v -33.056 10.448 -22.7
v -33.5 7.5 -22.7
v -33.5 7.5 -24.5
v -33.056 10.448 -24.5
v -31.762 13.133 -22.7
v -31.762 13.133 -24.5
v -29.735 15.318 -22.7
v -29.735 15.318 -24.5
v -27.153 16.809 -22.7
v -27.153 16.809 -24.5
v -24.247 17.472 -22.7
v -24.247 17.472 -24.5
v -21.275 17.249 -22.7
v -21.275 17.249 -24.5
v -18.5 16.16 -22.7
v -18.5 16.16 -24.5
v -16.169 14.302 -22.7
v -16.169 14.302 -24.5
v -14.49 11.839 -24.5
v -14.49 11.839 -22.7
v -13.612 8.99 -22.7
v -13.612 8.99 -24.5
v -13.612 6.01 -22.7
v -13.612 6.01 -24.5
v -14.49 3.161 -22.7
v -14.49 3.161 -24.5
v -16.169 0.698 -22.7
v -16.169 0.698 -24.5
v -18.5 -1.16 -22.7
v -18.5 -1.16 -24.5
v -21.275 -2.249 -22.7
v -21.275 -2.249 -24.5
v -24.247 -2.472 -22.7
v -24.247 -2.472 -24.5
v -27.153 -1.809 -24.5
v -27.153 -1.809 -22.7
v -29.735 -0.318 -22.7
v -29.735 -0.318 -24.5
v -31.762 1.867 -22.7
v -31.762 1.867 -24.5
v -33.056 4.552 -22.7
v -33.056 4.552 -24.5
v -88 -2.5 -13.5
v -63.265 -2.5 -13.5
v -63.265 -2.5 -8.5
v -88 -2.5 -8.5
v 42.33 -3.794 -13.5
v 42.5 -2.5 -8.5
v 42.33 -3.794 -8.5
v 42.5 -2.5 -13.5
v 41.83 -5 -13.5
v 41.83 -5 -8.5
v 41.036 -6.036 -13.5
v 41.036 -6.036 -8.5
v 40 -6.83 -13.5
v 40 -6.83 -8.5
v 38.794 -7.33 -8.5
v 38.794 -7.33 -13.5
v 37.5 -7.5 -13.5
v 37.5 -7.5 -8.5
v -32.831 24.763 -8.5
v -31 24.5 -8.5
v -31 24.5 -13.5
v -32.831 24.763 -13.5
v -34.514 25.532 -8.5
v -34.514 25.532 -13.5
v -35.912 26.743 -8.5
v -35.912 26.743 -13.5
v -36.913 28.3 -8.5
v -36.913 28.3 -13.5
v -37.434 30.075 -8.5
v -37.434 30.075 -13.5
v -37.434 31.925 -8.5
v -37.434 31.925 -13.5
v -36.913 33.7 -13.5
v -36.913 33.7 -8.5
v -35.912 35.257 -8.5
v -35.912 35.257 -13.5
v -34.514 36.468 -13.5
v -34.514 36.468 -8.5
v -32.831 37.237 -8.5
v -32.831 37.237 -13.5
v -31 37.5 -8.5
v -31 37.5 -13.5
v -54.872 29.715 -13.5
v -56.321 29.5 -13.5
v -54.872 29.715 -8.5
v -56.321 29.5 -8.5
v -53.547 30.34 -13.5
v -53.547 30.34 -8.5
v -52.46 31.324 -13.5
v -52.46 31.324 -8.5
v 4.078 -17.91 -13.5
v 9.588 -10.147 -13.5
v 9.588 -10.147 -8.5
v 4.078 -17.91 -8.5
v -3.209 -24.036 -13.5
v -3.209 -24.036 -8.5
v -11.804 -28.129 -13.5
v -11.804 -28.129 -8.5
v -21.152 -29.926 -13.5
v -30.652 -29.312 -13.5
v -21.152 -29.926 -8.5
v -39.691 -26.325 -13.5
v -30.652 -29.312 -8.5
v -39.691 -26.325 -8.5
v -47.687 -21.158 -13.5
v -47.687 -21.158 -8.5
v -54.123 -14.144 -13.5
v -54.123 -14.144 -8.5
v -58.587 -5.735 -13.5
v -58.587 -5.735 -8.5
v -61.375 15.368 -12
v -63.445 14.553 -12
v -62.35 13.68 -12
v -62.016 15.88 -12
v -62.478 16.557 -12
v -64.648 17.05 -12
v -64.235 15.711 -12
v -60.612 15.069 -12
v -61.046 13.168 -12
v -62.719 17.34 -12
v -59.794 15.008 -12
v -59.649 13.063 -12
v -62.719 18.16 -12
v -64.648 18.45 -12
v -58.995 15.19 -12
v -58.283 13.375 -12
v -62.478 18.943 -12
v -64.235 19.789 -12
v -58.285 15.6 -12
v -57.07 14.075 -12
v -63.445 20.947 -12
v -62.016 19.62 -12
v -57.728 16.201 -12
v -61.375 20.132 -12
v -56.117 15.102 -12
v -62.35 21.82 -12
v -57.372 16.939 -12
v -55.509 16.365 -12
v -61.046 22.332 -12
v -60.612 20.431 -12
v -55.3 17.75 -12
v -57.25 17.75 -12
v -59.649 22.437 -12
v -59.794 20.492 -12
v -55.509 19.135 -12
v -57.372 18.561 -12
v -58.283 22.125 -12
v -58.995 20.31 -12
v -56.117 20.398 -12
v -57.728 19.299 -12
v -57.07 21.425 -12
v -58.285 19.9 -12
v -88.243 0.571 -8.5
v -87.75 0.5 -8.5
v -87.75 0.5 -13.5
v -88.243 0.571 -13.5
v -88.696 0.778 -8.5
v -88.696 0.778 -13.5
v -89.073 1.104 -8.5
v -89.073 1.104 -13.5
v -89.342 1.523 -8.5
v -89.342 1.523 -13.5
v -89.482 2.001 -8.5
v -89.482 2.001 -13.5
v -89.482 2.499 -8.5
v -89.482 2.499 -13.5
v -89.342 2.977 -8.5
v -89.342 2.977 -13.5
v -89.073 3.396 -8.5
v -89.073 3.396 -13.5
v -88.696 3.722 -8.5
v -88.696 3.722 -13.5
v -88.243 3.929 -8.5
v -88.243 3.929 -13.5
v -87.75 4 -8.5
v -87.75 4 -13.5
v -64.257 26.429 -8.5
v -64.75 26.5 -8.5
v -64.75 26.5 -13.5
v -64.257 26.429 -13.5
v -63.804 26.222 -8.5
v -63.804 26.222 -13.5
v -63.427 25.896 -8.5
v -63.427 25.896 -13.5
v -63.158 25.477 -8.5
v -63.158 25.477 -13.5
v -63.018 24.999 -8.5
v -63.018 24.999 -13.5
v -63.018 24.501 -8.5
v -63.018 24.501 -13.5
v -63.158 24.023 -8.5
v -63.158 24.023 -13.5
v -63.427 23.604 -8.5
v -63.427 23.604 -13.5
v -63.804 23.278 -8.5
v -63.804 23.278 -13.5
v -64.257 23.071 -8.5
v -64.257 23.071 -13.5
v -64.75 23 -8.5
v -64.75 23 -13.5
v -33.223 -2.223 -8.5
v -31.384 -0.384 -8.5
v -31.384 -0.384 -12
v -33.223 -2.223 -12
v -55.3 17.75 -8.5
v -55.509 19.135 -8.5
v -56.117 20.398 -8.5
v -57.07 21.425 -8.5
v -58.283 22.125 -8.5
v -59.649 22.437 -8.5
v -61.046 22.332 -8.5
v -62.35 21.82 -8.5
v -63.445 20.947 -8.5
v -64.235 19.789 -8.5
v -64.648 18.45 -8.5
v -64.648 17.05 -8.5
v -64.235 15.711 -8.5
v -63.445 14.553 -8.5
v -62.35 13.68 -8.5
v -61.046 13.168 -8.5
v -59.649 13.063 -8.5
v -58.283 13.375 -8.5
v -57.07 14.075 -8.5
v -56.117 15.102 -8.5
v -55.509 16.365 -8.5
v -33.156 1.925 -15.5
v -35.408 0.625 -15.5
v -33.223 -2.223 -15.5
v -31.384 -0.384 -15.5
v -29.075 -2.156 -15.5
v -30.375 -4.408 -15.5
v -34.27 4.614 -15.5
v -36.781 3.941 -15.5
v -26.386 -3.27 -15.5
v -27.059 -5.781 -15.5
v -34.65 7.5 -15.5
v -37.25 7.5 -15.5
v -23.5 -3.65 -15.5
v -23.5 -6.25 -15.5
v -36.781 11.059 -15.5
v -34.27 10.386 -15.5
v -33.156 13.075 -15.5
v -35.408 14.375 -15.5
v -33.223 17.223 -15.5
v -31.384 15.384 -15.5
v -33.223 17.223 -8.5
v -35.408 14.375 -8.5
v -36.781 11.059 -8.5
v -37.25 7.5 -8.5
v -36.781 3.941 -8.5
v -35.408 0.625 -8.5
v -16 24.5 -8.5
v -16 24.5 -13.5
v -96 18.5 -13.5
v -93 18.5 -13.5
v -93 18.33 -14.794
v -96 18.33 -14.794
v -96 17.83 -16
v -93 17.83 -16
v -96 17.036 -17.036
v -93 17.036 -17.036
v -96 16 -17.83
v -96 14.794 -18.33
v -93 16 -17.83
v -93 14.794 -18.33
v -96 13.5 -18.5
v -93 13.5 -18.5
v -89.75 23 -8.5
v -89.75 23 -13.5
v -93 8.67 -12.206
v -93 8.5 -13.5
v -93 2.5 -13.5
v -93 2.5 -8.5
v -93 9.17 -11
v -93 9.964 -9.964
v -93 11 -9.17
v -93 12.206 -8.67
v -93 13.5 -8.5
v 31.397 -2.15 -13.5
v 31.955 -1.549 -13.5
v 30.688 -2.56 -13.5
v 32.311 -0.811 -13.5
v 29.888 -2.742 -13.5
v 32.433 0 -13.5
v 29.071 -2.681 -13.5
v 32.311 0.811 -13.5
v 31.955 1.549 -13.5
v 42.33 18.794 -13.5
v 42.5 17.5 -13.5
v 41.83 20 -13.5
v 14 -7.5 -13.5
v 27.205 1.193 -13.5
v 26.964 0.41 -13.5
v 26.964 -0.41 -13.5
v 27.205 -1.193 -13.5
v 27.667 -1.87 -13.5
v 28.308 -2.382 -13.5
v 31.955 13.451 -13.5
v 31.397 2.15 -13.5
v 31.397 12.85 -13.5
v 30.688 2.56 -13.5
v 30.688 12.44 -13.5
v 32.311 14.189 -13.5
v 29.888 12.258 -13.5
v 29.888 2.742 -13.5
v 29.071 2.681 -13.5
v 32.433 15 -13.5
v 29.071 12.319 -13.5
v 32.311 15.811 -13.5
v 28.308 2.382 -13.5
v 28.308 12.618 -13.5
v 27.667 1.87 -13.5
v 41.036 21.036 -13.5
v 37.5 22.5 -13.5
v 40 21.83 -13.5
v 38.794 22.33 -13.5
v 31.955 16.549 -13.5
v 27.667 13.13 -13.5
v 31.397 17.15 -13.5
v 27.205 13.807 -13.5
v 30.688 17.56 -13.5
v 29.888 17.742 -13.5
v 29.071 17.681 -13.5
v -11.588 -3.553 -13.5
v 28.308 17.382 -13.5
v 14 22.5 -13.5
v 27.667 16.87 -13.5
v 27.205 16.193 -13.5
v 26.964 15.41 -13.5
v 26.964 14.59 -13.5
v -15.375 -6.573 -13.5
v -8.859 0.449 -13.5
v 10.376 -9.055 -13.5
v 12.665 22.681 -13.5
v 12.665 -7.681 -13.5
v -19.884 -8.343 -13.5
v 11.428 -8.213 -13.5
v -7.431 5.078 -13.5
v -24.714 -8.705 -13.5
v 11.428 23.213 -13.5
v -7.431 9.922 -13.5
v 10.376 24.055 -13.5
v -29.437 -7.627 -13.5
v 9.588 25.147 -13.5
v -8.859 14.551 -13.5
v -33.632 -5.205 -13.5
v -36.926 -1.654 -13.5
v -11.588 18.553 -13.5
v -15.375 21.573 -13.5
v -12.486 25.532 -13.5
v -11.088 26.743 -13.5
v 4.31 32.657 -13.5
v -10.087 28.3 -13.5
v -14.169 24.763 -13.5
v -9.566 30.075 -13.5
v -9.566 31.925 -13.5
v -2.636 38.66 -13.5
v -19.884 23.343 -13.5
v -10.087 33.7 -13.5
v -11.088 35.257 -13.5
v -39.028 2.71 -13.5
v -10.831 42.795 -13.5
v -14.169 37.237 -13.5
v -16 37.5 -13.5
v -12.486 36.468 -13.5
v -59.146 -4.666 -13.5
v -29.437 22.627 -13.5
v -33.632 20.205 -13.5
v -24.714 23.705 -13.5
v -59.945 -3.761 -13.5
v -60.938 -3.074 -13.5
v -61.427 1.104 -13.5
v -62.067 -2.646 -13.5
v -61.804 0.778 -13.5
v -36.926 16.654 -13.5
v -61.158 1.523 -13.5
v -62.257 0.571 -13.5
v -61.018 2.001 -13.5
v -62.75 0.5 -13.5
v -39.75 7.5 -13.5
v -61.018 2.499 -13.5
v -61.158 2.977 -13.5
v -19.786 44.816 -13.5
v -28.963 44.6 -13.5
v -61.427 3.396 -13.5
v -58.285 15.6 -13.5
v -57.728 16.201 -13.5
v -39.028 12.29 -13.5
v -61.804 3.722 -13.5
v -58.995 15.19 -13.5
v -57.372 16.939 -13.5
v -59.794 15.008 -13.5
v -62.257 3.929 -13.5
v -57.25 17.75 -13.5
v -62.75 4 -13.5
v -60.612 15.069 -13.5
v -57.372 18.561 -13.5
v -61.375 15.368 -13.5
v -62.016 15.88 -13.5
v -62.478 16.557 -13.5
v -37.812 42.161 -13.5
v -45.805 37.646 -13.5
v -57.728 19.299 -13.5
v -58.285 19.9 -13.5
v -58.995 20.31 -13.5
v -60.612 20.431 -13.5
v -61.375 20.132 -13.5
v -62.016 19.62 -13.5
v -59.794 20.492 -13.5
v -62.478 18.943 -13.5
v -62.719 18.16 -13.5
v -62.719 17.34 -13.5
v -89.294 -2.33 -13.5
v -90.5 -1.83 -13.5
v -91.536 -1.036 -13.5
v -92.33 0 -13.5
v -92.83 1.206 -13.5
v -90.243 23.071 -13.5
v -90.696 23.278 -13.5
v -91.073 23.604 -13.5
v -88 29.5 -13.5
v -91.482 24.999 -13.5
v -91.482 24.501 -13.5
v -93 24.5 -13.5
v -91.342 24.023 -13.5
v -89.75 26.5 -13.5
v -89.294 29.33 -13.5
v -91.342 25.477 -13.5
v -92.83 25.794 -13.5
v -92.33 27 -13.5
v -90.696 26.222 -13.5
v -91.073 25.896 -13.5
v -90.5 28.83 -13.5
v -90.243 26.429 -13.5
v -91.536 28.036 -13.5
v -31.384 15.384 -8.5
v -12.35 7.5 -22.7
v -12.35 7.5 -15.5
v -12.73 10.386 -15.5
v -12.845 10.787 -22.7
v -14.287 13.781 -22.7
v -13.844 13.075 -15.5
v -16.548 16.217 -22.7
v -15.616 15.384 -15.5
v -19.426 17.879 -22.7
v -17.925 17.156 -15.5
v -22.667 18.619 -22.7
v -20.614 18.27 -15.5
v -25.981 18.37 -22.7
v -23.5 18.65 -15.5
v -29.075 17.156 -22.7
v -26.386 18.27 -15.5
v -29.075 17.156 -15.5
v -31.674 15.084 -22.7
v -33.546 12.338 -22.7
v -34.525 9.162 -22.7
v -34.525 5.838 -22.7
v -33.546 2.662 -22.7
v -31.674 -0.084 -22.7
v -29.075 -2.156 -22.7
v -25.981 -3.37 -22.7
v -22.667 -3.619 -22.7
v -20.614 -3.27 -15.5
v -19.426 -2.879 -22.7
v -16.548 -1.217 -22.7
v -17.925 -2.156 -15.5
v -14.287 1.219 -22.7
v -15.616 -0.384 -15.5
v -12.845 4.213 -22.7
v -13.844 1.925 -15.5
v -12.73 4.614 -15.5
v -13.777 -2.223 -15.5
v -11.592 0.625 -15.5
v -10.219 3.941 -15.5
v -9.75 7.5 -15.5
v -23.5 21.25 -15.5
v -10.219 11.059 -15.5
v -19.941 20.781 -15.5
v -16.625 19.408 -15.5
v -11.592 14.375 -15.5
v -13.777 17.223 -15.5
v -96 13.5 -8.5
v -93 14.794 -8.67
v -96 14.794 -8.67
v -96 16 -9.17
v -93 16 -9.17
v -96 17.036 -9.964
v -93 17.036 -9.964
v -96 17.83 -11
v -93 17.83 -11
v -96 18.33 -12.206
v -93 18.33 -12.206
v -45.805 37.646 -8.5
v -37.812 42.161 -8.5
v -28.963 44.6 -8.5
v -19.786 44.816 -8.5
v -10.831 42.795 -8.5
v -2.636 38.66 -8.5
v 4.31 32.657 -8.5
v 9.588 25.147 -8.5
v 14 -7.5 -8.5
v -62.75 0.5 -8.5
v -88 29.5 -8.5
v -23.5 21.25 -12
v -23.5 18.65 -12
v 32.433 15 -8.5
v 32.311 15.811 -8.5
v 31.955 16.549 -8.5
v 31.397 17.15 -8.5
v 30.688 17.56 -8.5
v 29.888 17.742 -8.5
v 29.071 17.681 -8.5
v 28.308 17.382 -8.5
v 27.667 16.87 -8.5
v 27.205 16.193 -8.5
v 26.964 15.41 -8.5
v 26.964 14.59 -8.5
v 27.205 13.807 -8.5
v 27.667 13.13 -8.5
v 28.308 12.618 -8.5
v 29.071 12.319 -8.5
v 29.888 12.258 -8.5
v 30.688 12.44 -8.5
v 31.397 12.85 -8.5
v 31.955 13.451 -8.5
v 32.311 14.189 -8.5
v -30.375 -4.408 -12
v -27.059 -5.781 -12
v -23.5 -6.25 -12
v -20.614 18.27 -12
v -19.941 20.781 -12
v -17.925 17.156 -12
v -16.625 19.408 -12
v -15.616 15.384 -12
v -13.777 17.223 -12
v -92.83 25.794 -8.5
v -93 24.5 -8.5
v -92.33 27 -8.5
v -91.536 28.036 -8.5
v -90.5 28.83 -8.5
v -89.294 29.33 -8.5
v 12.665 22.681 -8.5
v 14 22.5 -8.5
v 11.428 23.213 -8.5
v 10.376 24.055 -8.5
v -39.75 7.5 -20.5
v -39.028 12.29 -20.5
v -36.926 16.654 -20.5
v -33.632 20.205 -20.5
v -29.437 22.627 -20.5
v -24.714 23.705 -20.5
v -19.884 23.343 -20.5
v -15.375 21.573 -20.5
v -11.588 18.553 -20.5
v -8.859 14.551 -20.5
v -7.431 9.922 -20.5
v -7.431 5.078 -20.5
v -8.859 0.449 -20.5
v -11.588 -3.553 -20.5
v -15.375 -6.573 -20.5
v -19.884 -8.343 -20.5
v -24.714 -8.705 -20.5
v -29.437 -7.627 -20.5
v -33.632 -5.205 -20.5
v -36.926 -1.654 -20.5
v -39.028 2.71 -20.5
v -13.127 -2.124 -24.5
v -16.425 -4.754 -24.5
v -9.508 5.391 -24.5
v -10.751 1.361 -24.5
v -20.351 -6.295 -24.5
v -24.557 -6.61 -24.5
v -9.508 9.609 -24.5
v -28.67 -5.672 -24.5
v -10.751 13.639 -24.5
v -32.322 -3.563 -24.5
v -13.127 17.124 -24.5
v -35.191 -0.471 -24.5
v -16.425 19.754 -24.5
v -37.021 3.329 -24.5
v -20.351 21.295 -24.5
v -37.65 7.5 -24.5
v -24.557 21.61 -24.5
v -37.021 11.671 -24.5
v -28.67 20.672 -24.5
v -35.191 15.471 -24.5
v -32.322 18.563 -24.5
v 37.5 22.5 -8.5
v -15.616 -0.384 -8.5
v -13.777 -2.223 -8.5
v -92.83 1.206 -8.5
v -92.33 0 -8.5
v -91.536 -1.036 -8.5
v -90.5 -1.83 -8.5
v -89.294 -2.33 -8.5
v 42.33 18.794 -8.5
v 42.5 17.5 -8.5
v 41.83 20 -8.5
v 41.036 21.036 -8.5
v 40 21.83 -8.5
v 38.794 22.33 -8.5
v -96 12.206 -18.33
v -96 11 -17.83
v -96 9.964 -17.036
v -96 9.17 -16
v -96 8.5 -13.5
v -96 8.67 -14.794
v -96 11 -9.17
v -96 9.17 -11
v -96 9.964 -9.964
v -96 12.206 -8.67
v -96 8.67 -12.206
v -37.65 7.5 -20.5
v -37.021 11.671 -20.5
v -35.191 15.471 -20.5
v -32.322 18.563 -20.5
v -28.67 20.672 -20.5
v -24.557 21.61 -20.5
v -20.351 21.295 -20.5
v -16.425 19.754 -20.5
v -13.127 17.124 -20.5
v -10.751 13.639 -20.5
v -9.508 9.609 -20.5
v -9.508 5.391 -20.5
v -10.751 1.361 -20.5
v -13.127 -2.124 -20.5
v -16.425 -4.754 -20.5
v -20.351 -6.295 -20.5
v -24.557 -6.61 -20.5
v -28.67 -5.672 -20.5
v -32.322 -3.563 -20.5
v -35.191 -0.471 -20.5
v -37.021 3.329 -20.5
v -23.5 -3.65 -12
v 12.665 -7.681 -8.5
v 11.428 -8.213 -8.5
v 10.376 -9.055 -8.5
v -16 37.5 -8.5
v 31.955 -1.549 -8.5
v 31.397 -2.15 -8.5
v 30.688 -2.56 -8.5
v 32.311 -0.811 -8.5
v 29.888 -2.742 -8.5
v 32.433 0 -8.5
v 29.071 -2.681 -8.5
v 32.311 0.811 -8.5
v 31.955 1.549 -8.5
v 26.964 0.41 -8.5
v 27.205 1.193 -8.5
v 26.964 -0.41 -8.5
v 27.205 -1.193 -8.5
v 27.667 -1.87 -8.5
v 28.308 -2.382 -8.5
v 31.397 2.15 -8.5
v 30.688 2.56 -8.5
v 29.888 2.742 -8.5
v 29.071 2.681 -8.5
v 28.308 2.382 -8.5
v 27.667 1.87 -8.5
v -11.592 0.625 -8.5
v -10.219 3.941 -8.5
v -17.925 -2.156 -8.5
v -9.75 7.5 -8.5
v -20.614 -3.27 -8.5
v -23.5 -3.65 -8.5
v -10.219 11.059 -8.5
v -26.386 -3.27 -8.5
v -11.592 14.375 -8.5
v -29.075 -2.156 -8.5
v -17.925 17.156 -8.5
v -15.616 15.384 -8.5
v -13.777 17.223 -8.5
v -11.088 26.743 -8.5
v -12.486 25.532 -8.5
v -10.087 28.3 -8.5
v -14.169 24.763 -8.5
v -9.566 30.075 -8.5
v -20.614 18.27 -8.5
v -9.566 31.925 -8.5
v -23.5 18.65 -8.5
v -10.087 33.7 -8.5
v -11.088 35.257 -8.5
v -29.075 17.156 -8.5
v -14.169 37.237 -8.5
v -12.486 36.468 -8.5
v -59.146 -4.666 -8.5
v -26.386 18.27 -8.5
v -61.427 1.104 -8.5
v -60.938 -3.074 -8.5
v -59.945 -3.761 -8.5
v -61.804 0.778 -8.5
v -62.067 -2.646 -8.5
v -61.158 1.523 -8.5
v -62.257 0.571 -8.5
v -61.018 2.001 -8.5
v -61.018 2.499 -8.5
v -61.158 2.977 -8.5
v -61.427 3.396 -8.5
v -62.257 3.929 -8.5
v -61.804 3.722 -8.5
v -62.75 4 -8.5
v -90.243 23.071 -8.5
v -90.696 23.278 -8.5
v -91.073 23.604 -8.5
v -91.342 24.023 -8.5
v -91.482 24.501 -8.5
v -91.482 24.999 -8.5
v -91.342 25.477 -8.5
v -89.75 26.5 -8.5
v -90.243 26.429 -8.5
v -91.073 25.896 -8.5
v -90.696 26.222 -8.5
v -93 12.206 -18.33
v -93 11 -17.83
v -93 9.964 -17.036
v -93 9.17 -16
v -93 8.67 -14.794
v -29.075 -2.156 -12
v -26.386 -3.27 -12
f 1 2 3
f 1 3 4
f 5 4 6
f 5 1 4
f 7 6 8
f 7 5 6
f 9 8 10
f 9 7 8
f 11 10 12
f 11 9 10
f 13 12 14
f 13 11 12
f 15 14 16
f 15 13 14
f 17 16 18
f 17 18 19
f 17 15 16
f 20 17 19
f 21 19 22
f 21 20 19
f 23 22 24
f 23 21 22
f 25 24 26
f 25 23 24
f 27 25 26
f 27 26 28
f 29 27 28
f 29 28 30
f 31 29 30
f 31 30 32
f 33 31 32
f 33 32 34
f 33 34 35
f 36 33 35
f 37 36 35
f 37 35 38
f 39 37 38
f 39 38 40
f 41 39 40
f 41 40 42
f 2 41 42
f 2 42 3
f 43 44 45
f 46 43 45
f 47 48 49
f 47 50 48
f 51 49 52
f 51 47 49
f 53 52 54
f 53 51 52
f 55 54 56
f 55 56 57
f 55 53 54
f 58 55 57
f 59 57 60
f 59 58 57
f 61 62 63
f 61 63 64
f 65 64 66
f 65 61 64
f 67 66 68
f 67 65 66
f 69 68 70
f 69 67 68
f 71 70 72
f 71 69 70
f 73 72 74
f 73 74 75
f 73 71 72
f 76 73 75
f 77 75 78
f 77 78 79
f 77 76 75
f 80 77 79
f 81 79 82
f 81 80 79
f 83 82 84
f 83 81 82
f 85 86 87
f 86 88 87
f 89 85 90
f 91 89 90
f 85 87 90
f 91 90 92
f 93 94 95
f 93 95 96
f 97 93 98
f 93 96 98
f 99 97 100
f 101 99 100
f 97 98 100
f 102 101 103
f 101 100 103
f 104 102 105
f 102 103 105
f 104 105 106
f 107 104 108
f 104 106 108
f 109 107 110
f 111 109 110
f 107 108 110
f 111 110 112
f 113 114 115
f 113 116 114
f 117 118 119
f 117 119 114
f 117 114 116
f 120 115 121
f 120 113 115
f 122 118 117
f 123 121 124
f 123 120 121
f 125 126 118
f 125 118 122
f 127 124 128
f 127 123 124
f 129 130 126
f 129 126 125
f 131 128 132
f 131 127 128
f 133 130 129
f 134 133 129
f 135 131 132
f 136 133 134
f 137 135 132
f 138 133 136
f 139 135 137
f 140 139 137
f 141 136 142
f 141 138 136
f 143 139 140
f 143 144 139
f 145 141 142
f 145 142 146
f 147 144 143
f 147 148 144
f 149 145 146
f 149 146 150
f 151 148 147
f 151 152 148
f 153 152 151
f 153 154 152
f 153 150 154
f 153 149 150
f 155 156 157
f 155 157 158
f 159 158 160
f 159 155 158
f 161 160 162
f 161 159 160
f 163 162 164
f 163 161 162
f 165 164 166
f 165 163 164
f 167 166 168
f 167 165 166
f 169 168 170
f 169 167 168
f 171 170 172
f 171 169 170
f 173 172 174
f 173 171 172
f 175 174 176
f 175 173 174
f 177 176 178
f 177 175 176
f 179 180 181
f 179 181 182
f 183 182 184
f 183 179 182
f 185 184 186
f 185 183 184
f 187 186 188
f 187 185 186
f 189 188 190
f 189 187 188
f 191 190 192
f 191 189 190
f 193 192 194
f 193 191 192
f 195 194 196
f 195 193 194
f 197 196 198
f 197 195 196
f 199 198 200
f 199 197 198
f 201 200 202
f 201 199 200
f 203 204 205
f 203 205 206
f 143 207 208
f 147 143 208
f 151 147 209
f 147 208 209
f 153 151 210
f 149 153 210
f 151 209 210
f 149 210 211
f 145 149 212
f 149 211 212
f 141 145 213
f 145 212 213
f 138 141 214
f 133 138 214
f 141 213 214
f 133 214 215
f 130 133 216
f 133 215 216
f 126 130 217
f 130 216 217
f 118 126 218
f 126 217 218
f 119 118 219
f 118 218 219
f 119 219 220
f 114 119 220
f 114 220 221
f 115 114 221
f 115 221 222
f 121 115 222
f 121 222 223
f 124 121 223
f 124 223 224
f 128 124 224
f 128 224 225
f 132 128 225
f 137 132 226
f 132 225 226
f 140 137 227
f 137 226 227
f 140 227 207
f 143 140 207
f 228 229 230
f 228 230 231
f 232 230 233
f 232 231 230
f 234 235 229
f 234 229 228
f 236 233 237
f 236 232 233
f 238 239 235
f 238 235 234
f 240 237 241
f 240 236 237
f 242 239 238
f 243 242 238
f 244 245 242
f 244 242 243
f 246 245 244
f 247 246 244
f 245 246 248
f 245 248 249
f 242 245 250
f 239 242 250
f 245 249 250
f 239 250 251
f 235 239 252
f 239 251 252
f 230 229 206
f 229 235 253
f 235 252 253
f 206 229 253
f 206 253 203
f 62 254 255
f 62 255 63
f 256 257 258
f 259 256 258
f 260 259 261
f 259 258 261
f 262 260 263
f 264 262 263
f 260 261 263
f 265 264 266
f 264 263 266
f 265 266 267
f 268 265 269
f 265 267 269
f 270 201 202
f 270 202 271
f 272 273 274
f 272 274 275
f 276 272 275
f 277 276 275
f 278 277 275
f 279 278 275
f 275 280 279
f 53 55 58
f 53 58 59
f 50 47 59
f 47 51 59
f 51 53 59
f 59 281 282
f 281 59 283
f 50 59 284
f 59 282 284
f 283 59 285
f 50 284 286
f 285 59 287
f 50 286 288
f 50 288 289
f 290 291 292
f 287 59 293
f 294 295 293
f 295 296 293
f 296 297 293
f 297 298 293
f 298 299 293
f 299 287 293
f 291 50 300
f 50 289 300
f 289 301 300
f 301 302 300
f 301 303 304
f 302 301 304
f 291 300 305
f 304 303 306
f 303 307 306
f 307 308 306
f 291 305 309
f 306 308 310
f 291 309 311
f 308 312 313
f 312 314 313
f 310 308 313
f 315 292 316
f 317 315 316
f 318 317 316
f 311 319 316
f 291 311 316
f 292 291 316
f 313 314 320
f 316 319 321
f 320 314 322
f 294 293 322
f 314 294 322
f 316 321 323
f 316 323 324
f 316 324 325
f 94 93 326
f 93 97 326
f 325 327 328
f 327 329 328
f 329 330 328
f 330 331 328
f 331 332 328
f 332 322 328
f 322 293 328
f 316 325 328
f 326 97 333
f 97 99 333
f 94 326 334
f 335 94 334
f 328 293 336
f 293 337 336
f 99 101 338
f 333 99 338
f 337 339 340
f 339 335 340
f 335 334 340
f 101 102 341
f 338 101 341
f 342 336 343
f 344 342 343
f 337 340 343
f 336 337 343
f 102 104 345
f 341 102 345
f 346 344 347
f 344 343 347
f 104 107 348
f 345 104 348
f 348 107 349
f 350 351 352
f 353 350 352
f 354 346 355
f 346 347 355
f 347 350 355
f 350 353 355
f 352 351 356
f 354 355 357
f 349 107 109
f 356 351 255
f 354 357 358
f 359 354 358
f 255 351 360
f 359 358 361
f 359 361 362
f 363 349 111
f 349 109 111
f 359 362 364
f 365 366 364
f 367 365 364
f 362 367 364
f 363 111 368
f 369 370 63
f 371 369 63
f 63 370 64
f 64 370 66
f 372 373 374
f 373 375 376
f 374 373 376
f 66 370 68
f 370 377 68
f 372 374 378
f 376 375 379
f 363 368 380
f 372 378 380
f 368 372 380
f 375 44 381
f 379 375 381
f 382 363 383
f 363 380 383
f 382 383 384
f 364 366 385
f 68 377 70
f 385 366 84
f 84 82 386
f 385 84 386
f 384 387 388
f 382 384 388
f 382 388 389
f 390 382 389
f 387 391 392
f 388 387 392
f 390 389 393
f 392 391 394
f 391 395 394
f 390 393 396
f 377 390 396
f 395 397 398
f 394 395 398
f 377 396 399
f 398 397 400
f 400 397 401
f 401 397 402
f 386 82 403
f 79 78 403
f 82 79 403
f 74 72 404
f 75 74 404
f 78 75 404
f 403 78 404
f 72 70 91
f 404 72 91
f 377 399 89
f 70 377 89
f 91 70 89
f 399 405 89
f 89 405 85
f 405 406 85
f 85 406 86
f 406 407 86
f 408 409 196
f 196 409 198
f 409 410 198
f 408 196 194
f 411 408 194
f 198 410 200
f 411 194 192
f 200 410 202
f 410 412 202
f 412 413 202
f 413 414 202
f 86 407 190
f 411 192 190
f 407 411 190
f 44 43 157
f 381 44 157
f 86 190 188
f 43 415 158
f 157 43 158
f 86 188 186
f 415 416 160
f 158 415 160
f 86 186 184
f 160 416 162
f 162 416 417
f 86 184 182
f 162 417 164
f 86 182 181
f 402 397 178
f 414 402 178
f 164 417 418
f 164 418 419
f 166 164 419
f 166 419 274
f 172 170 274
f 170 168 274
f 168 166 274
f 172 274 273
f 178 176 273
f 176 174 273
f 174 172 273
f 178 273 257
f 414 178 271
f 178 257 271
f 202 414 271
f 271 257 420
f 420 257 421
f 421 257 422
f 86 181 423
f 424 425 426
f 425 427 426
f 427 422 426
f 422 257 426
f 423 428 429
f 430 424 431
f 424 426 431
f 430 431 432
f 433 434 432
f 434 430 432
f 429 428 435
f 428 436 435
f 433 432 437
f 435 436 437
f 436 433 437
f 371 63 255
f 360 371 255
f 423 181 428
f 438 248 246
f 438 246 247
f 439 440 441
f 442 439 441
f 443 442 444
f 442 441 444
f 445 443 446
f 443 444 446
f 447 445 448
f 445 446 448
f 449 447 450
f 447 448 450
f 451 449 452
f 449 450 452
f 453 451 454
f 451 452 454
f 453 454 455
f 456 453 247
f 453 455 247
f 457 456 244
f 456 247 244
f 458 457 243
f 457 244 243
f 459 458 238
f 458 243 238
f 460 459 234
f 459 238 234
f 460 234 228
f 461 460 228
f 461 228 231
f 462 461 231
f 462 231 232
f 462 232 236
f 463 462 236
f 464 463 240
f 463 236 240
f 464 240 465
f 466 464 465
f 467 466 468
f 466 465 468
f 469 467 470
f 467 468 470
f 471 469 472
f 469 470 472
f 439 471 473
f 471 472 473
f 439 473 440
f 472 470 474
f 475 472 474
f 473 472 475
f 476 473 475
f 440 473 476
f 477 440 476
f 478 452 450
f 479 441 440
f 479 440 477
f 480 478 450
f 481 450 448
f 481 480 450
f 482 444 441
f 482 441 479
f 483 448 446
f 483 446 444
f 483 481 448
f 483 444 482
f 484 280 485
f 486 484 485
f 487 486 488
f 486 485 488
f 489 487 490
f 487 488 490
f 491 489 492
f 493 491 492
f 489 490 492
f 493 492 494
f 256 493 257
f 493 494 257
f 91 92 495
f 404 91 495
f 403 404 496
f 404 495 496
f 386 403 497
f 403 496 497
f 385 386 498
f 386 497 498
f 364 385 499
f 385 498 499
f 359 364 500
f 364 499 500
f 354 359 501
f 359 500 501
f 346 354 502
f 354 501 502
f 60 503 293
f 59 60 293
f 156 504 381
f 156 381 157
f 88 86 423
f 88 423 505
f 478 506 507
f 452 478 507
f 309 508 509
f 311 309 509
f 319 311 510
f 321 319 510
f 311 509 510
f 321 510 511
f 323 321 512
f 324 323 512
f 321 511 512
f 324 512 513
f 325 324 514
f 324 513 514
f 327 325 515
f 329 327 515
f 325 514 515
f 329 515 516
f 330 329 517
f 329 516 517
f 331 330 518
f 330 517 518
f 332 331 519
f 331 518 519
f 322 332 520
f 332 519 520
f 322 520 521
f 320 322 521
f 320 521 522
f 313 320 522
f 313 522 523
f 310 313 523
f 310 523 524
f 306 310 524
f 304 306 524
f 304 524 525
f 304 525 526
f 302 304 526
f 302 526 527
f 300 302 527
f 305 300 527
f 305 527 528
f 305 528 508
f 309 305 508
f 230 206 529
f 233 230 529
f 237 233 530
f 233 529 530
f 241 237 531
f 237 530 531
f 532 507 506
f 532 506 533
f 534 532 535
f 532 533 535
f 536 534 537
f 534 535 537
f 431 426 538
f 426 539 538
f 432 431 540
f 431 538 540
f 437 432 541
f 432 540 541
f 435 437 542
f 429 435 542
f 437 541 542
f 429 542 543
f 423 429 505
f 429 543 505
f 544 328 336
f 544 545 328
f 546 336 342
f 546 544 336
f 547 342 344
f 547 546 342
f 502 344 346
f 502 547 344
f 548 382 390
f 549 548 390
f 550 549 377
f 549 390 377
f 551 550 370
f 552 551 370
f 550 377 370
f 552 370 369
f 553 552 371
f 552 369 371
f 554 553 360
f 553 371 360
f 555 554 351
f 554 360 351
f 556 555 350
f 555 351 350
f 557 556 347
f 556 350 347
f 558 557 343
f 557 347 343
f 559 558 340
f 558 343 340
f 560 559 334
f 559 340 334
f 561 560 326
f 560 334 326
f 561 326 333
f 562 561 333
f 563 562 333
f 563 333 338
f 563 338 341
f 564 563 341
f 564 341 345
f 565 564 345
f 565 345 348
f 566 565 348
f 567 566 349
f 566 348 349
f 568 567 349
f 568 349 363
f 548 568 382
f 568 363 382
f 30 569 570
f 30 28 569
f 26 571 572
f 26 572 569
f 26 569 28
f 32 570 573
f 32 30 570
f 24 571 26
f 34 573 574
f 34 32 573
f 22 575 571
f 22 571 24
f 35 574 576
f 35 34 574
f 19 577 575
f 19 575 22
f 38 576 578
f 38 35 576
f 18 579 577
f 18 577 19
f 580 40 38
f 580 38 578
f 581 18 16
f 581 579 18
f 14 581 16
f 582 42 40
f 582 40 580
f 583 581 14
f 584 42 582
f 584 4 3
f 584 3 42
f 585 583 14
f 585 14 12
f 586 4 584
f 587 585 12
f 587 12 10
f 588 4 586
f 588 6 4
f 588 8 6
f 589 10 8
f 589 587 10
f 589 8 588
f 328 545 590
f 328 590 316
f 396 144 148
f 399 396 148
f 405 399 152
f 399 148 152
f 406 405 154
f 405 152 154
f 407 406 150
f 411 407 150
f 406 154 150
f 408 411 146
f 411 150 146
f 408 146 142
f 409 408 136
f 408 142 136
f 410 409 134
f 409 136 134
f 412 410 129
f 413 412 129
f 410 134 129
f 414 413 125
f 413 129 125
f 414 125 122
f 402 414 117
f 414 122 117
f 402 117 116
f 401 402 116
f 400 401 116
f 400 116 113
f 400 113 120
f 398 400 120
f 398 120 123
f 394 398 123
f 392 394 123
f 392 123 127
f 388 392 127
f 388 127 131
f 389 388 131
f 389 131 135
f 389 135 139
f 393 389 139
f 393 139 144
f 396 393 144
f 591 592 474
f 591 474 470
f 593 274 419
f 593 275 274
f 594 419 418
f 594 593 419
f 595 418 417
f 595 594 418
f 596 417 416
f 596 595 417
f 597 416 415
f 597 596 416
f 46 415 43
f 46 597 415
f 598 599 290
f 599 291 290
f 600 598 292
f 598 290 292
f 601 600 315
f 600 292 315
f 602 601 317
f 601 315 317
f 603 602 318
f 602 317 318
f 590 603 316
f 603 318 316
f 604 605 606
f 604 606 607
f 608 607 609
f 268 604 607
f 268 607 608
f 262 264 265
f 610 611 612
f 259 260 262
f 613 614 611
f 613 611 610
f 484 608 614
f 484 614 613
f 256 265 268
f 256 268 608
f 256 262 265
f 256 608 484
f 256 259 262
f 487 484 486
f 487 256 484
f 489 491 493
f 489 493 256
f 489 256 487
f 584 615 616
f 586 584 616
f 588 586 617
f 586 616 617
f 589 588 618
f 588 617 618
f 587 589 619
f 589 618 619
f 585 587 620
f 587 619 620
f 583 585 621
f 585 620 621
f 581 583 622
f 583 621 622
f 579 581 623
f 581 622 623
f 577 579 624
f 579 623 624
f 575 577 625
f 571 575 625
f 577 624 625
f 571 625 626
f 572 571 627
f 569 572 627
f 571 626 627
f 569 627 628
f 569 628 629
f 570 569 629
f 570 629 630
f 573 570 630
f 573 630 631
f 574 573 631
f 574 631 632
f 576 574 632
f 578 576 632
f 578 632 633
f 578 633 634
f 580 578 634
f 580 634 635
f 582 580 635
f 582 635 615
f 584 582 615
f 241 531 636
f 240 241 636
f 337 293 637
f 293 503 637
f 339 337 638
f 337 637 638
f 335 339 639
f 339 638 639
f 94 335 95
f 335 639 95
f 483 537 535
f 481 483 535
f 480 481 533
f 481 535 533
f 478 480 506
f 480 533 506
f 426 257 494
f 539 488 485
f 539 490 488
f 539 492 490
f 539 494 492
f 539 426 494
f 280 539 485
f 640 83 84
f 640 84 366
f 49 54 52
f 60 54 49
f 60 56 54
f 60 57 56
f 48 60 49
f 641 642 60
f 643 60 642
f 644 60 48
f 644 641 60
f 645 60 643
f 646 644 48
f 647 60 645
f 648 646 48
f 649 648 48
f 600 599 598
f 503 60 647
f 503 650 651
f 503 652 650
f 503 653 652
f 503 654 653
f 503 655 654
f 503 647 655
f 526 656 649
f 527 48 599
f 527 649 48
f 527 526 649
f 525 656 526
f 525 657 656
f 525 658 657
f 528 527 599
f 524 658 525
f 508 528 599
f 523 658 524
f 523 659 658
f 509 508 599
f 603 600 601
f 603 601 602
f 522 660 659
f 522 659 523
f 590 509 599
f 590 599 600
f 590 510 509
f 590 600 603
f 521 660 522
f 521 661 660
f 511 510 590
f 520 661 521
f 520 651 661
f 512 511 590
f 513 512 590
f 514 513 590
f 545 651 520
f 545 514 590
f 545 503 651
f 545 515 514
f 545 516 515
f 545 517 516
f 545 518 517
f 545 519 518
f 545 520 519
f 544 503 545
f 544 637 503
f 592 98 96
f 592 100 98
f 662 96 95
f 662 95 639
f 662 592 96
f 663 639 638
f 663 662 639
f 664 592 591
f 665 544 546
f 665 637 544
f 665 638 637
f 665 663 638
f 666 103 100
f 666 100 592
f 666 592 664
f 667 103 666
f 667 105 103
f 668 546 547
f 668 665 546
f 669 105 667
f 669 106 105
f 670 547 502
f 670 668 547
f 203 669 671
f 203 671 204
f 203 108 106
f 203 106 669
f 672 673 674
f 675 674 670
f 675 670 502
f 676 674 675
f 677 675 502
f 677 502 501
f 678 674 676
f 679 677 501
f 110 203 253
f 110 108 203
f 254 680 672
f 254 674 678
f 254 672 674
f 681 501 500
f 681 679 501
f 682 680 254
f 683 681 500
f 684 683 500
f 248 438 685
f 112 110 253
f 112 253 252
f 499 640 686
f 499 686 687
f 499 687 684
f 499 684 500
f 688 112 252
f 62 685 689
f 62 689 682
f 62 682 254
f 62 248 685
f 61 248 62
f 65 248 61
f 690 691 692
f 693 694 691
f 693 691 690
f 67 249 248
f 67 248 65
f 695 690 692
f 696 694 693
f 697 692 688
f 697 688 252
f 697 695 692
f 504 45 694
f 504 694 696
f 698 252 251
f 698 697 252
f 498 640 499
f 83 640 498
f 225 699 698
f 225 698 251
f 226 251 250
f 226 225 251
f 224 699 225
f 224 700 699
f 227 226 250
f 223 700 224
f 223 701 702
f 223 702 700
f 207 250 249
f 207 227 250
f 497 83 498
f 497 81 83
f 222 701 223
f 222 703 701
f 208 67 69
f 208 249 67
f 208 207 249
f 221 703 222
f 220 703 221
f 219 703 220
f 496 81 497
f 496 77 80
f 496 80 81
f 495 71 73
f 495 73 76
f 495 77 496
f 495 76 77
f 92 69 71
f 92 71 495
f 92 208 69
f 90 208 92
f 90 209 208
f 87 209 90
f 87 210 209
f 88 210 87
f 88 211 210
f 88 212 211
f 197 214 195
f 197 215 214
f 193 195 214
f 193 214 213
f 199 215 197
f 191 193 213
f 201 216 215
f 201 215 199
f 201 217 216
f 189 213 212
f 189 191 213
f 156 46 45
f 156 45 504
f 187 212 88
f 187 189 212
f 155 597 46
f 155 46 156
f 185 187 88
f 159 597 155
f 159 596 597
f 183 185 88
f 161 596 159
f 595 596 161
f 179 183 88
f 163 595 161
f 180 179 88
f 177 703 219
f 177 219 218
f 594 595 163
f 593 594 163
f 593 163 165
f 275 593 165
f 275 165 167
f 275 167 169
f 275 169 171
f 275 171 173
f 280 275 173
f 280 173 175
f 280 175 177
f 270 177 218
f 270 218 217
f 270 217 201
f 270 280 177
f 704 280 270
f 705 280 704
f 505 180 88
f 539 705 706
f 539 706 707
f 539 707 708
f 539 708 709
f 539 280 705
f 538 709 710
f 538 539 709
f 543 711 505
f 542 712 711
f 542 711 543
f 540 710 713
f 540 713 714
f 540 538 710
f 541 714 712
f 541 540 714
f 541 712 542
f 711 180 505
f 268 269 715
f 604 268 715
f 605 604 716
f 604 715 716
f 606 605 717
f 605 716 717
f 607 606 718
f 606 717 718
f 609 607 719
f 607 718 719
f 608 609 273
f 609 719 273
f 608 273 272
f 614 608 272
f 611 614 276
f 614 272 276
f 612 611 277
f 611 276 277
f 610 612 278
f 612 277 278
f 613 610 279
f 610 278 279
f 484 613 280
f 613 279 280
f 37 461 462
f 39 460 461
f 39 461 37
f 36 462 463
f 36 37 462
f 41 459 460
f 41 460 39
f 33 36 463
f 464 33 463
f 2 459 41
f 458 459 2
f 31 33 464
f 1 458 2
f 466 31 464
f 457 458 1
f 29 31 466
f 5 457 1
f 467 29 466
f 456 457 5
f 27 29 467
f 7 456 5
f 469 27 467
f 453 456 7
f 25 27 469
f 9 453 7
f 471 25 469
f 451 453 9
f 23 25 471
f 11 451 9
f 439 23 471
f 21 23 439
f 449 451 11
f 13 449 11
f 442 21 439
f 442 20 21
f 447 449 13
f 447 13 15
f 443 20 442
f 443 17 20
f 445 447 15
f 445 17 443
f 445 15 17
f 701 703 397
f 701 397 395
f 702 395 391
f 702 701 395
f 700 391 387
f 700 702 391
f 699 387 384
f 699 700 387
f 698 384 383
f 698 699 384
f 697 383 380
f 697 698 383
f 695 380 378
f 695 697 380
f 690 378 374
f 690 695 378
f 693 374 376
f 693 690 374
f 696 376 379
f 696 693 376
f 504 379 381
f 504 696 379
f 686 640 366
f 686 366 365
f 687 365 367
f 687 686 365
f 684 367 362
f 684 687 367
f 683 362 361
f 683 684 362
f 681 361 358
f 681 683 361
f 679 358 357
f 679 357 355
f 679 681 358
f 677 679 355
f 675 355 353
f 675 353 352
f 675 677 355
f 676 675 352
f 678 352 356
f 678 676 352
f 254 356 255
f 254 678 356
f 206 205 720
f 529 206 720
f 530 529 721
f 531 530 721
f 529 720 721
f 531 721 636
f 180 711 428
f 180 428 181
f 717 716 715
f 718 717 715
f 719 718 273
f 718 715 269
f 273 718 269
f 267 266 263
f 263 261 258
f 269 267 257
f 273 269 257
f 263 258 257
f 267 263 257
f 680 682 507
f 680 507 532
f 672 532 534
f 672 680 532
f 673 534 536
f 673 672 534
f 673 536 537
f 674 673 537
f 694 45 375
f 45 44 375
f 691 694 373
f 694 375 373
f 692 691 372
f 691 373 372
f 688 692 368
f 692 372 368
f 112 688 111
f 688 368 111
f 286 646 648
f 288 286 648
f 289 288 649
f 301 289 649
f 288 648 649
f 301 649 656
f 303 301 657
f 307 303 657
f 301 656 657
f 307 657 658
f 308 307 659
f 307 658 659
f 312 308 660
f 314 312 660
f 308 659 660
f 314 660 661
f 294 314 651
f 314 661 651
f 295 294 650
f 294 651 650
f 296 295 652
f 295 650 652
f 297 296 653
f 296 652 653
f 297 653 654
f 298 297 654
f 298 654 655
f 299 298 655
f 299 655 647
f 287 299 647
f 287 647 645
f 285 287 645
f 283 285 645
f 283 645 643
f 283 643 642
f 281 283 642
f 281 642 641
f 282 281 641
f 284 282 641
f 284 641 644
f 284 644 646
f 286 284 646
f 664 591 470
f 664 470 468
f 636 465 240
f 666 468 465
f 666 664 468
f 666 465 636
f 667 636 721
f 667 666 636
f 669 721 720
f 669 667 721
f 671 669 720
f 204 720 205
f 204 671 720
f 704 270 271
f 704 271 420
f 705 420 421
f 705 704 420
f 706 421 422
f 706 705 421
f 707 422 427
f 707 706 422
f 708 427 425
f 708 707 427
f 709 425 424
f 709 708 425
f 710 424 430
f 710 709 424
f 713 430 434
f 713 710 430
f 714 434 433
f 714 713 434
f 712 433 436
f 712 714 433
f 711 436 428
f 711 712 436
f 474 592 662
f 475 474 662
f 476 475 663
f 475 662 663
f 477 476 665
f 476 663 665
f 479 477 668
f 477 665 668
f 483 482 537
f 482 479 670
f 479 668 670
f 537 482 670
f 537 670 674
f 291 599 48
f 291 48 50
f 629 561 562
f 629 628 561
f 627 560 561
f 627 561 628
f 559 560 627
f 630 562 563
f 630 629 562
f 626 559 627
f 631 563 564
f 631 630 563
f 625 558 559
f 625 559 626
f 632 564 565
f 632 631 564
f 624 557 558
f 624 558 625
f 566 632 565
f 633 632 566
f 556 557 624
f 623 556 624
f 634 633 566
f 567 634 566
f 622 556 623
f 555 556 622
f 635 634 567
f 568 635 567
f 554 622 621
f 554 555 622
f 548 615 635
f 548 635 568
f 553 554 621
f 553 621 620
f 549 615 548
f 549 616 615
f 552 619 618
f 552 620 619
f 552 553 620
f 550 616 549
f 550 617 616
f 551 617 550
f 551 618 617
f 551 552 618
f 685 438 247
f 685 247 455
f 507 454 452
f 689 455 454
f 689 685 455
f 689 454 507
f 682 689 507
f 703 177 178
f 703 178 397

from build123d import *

# Parameters (mm, degrees)
SKETCH2_R                = 37.5
SKETCH2_R_2              = 4.2
BOSS_EXTRUDE1_DEPTH      = 5
SKETCH3_R                = 11.15
CUT_EXTRUDE1_DEPTH       = 76.967098141
SKETCH5_R                = 14.15
SKETCH5_R_2              = 11.15
BOSS_EXTRUDE2_DEPTH      = 10
BOSS_EXTRUDE3_START      = -2
SKETCH6_R                = 14.15
SKETCH6_R_2              = 9
BOSS_EXTRUDE3_DEPTH      = 2
SKETCH7_R                = 11.15
CUT_EXTRUDE2_DEPTH       = 10
SKETCH8_R                = 14.15
SKETCH8_R_2              = 10
BOSS_EXTRUDE4_DEPTH      = 2
BOSS_EXTRUDE5_DEPTH      = 5
BOSS_EXTRUDE5_DEPTH_BACK = 5
SKETCH10_W               = 10
SKETCH10_H               = 30
BOSS_EXTRUDE6_DEPTH      = 10
CUT_EXTRUDE3_START       = -5
CUT_EXTRUDE3_DEPTH       = 5
SKETCH12_R               = 2.75
CUT_EXTRUDE4_DEPTH       = 78.472575793
BOSS_EXTRUDE7_DEPTH      = 5
SKETCH15_R               = 13.75
CUT_EXTRUDE5_DEPTH       = 7
SKETCH17_R               = 16.25
SKETCH17_R_2             = 14.15
BOSS_EXTRUDE8_DEPTH      = 7
BOSS_EXTRUDE9_START      = 7
BOSS_EXTRUDE9_DEPTH      = 7
CUT_EXTRUDE7_START       = 3.5
CUT_EXTRUDE7_DEPTH       = 3.5
SKETCH20_R               = 11.15
CUT_EXTRUDE8_DEPTH       = 0.2
BOSS_EXTRUDE10_DEPTH     = 5
SKETCH22_W               = 5
SKETCH22_H               = 20
BOSS_EXTRUDE11_DEPTH     = 7
SKETCH23_W               = 23.357919263
SKETCH23_H               = 5
BOSS_EXTRUDE12_DEPTH     = 12
SKETCH24_W               = 5
SKETCH24_H               = 12
BOSS_EXTRUDE13_DEPTH     = 12
SKETCH25_W               = 5
SKETCH25_H               = 32
BOSS_EXTRUDE14_DEPTH     = 10
CUT_EXTRUDE9_DEPTH       = 105.546640309
FILLET2_R                = 5
SKETCH27_W               = 14.087346568
SKETCH27_H               = 5
CUT_EXTRUDE10_DEPTH      = 110.569612576
SKETCH28_R               = 2.75
BOSS_EXTRUDE15_DEPTH     = 5
SKETCH29_W               = 5
SKETCH29_H               = 30
BOSS_EXTRUDE16_DEPTH     = 15
SKETCH30_R               = 2.75
CUT_EXTRUDE12_DEPTH      = 15
FILLET3_R                = 5
BOSS_EXTRUDE18_DEPTH     = 3
SKETCH34_R               = 2.75
CUT_EXTRUDE13_DEPTH      = 108.224064463
SKETCH35_R               = 4.7
CUT_EXTRUDE14_DEPTH      = 3.5


with BuildPart() as part:
    # Sketch2 → Boss-Extrude1 (new body)
    with BuildSketch(Plane(origin=(0, 0, -8.5), x_dir=(-1, 0, 0), z_dir=(0, 0, -1))):
        with Locations((23.5, 7.5)):
            Circle(SKETCH2_R)
        with Locations((23.5, 7.5)):
            Circle(SKETCH2_R_2, mode=Mode.SUBTRACT)
        with BuildLine():
            ThreePointArc((31, 24.5), (37.5, 31), (31, 37.5))
            Line((31, 37.5), (16, 37.5))
            ThreePointArc((16, 37.5), (9.5, 31), (16, 24.5))
            Line((16, 24.5), (31, 24.5))
        make_face(mode=Mode.SUBTRACT)
    extrude(amount=BOSS_EXTRUDE1_DEPTH)

    # Sketch3 → Cut-Extrude1 (cut, through all)
    with BuildSketch(Plane.XY.offset(-8.5)):
        with Locations((-23.5, 7.5)):
            Circle(SKETCH3_R)
    extrude(amount=-CUT_EXTRUDE1_DEPTH, mode=Mode.SUBTRACT)

    # Sketch5 → Boss-Extrude2 (add)
    with BuildSketch(Plane(origin=(0, 0, -13.5), x_dir=(-1, 0, 0), z_dir=(0, 0, -1))):
        with Locations((23.5, 7.5)):
            Circle(SKETCH5_R)
        with Locations(Location((23.5, 7.5, 0), (0, 0, 180))):
            Circle(SKETCH5_R_2, mode=Mode.SUBTRACT)
    extrude(amount=BOSS_EXTRUDE2_DEPTH)

    # Sketch6 → Boss-Extrude3 (add)
    with BuildSketch(Plane(origin=(0, 0, -23.5), x_dir=(-1, 0, 0), z_dir=(0, 0, -1)).offset(BOSS_EXTRUDE3_START)):
        with Locations((23.5, 7.5)):
            Circle(SKETCH6_R)
        with Locations((23.5, 7.5)):
            Circle(SKETCH6_R_2, mode=Mode.SUBTRACT)
    extrude(amount=BOSS_EXTRUDE3_DEPTH)

    # Sketch7 → Cut-Extrude2 (cut)
    with BuildSketch(Plane.XY.offset(-21.5)):
        with Locations((-23.5, 7.5)):
            Circle(SKETCH7_R)
    extrude(amount=-CUT_EXTRUDE2_DEPTH, mode=Mode.SUBTRACT)

    # Sketch8 → Boss-Extrude4 (add)
    with BuildSketch(Plane(origin=(0, 0, -22.5), x_dir=(-1, 0, 0), z_dir=(0, 0, -1))):
        with Locations((23.5, 7.5)):
            Circle(SKETCH8_R)
        with Locations((23.5, 7.5)):
            Circle(SKETCH8_R_2, mode=Mode.SUBTRACT)
    extrude(amount=BOSS_EXTRUDE4_DEPTH)

    # Sketch9 → Boss-Extrude5 (add, two sides: drawn at the far end of the back side and taken through both)
    with BuildSketch(Plane.XY.offset(-8.5).offset(-BOSS_EXTRUDE5_DEPTH_BACK)):
        with BuildLine():
            Line((17.5, 22.5), (10.869317712, 22.5))
            ThreePointArc((10.869317712, 22.5), (13.208986735, 15.161611638), (14, 7.5))
            ThreePointArc((14, 7.5), (13.208986735, -0.161611638), (10.869317712, -7.5))
            Line((10.869317712, -7.5), (17.5, -7.5))
            Line((17.5, -7.5), (17.5, 22.5))
        make_face()
        with BuildLine():
            Line((10.869317712, 22.5), (8.122776602, 22.5))
            ThreePointArc((8.122776602, 22.5), (10.645257219, 15.187744108), (11.5, 7.5))
            ThreePointArc((11.5, 7.5), (10.645257219, -0.187744108), (8.122776602, -7.5))
            Line((8.122776602, -7.5), (10.869317712, -7.5))
            ThreePointArc((10.869317712, -7.5), (13.208986735, -0.161611638), (14, 7.5))
            ThreePointArc((14, 7.5), (13.208986735, 15.161611638), (10.869317712, 22.5))
        make_face()
    extrude(amount=BOSS_EXTRUDE5_DEPTH + BOSS_EXTRUDE5_DEPTH_BACK)

    # Sketch10 → Boss-Extrude6 (add)
    with BuildSketch(Plane(origin=(17.5, 0, 0), x_dir=(0, 0, -1), z_dir=(1, 0, 0))):
        with Locations((8.5, 7.5)):
            Rectangle(SKETCH10_W, SKETCH10_H)
    extrude(amount=BOSS_EXTRUDE6_DEPTH)

    # Sketch11 → Cut-Extrude3 (cut)
    with BuildSketch(Plane.XY.offset(-3.5).offset(CUT_EXTRUDE3_START)):
        with BuildLine():
            Line((27.5, 22.5), (8.122776602, 22.5))
            ThreePointArc((8.122776602, 22.5), (11.5, 7.5), (8.122776602, -7.5))
            Line((8.122776602, -7.5), (27.5, -7.5))
            Line((27.5, -7.5), (27.5, 22.5))
        make_face()
    extrude(amount=CUT_EXTRUDE3_DEPTH, mode=Mode.SUBTRACT)

    # Sketch12 → Cut-Extrude4 (cut, through all)
    with BuildSketch(Plane.XY.offset(-8.5)):
        with Locations((17.5, 15)):
            Circle(SKETCH12_R)
        with Locations((17.5, 0)):
            Circle(SKETCH12_R)
    extrude(amount=-CUT_EXTRUDE4_DEPTH, mode=Mode.SUBTRACT)

    # Sketch13 → Boss-Extrude7 (add)
    # profile 1 of 2: a face of its own
    with BuildSketch(Plane(origin=(0, 0, -13.5), x_dir=(-1, 0, 0), z_dir=(0, 0, -1))):
        Polygon((-21.021836642, -6.1), (-13.978163358, -6.1), (-10.456326716, 0), (-13.978163358, 6.1), (-21.021836642, 6.1), (-24.543673284, 0), align=None)
        Polygon((-22.234272207, 0), (-19.867136104, -4.1), (-15.132863896, -4.1), (-12.765727793, 0), (-15.132863896, 4.1), (-19.867136104, 4.1), align=None, mode=Mode.SUBTRACT)
    # profile 2 of 2: a face of its own
    with BuildSketch(Plane(origin=(0, 0, -13.5), x_dir=(-1, 0, 0), z_dir=(0, 0, -1))):
        Polygon((-21.021836642, 8.9), (-13.978163358, 8.9), (-10.456326716, 15), (-13.978163358, 21.1), (-21.021836642, 21.1), (-24.543673284, 15), align=None)
        Polygon((-22.234272207, 15), (-19.867136104, 10.9), (-15.132863896, 10.9), (-12.765727793, 15), (-15.132863896, 19.1), (-19.867136104, 19.1), align=None, mode=Mode.SUBTRACT)
    extrude(amount=BOSS_EXTRUDE7_DEPTH)

    # Sketch15 → Cut-Extrude5 (cut)
    with BuildSketch(Plane.XY.offset(-8.5)):
        with Locations((-23.5, 7.5)):
            Circle(SKETCH15_R)
    extrude(amount=-CUT_EXTRUDE5_DEPTH, mode=Mode.SUBTRACT)

    # Sketch17 → Boss-Extrude8 (add)
    with BuildSketch(Plane(origin=(0, 0, -13.5), x_dir=(-1, 0, 0), z_dir=(0, 0, -1))):
        with Locations((23.5, 7.5)):
            Circle(SKETCH17_R)
        with Locations((23.5, 7.5)):
            Circle(SKETCH17_R_2, mode=Mode.SUBTRACT)
    extrude(amount=BOSS_EXTRUDE8_DEPTH)

    # Sketch18 → Boss-Extrude9 (add)
    with BuildSketch(Plane.XY.offset(-15.5).offset(BOSS_EXTRUDE9_START)):
        with BuildLine():
            ThreePointArc((-31.38424061, 15.38424061), (-27.766920271, 17.801256788), (-23.5, 18.65))
            Line((-23.5, 18.65), (-23.5, 21.25))
            ThreePointArc((-23.5, 21.25), (-28.761897195, 20.203343572), (-33.222718241, 17.222718241))
            Line((-33.222718241, 17.222718241), (-31.38424061, 15.38424061))
        make_face()
        with BuildLine():
            Line((-23.5, 21.25), (-23.5, 18.65))
            ThreePointArc((-23.5, 18.65), (-19.233079729, 17.801256788), (-15.61575939, 15.38424061))
            Line((-15.61575939, 15.38424061), (-13.777281759, 17.222718241))
            ThreePointArc((-13.777281759, 17.222718241), (-18.238102805, 20.203343572), (-23.5, 21.25))
        make_face()
        with BuildLine():
            ThreePointArc((-15.61575939, -0.38424061), (-23.5, -3.65), (-31.38424061, -0.38424061))
            Line((-31.38424061, -0.38424061), (-33.222718241, -2.222718241))
            ThreePointArc((-33.222718241, -2.222718241), (-23.5, -6.25), (-13.777281759, -2.222718241))
            Line((-13.777281759, -2.222718241), (-15.61575939, -0.38424061))
        make_face()
    extrude(amount=-BOSS_EXTRUDE9_DEPTH)

    # Sketch19 → Cut-Extrude7 (cut)
    with BuildSketch(Plane.XY.offset(-15.5).offset(CUT_EXTRUDE7_START)):
        with BuildLine():
            Line((-23.5, 21.25), (-23.5, 18.65))
            ThreePointArc((-23.5, 18.65), (-19.233079729, 17.801256788), (-15.61575939, 15.38424061))
            Line((-15.61575939, 15.38424061), (-13.777281759, 17.222718241))
            ThreePointArc((-13.777281759, 17.222718241), (-18.238102805, 20.203343572), (-23.5, 21.25))
        make_face()
        with BuildLine():
            Line((-23.5, -6.25), (-23.5, -3.65))
            ThreePointArc((-23.5, -3.65), (-27.766920271, -2.801256788), (-31.38424061, -0.38424061))
            Line((-31.38424061, -0.38424061), (-33.222718241, -2.222718241))
            ThreePointArc((-33.222718241, -2.222718241), (-28.761897195, -5.203343572), (-23.5, -6.25))
        make_face()
    extrude(amount=-CUT_EXTRUDE7_DEPTH, mode=Mode.SUBTRACT)

    # Sketch20 → Cut-Extrude8 (cut)
    with BuildSketch(Plane.XY.offset(-22.5)):
        with Locations((-23.5, 7.5)):
            Circle(SKETCH20_R)
    extrude(amount=-CUT_EXTRUDE8_DEPTH, mode=Mode.SUBTRACT)

    # Sketch21 → Boss-Extrude10 (add)
    with BuildSketch(Plane.XY.offset(-8.5)):
        with BuildLine():
            Line((-76, 7.5), (-61, 7.5))
            ThreePointArc((-61, 7.5), (-60.658969493, 12.545888047), (-59.642080737, 17.5))
            Line((-59.642080737, 17.5), (-61, 17.5))
            Line((-61, 17.5), (-76, 17.5))
            Line((-76, 17.5), (-76, 7.5))
        make_face()
        with BuildLine():
            ThreePointArc((-59.642080737, -2.5), (-60.658969493, 2.454111953), (-61, 7.5))
            Line((-61, 7.5), (-76, 7.5))
            Line((-76, 7.5), (-76, -2.5))
            Line((-76, -2.5), (-61, -2.5))
            Line((-61, -2.5), (-59.642080737, -2.5))
        make_face()
    extrude(amount=-BOSS_EXTRUDE10_DEPTH)

    # Sketch22 → Boss-Extrude11 (add)
    with BuildSketch(Plane.ZY.offset(76)):
        with Locations((-11, 7.5)):
            Rectangle(SKETCH22_W, SKETCH22_H)
    extrude(amount=BOSS_EXTRUDE11_DEPTH)

    # Sketch23 → Boss-Extrude12 (add)
    with BuildSketch(Plane(origin=(0, 17.5, 0), x_dir=(1, 0, 0), z_dir=(0, 1, 0))):
        with Locations((-71.321040369, 11)):
            Rectangle(SKETCH23_W, SKETCH23_H)
    extrude(amount=BOSS_EXTRUDE12_DEPTH)

    # Sketch24 → Boss-Extrude13 (add)
    with BuildSketch(Plane(origin=(-59.642080737, 0, 0), x_dir=(0, 0, -1), z_dir=(1, 0, 0))):
        with Locations((11, 23.5)):
            Rectangle(SKETCH24_W, SKETCH24_H)
    extrude(amount=BOSS_EXTRUDE13_DEPTH)

    # Sketch25 → Boss-Extrude14 (add)
    with BuildSketch(Plane.ZY.offset(83)):
        with Locations((-11, 13.5)):
            Rectangle(SKETCH25_W, SKETCH25_H)
    extrude(amount=BOSS_EXTRUDE14_DEPTH)

    # Sketch26 → Cut-Extrude9 (cut, through all)
    with BuildSketch(Plane.XY.offset(-8.5)):
        with BuildLine():
            Line((-64.75, 23), (-89.75, 23))
            ThreePointArc((-89.75, 23), (-91.5, 24.75), (-89.75, 26.5))
            Line((-89.75, 26.5), (-64.75, 26.5))
            ThreePointArc((-64.75, 26.5), (-63, 24.75), (-64.75, 23))
        make_face()
        with BuildLine():
            Line((-87.75, 4), (-62.75, 4))
            ThreePointArc((-62.75, 4), (-61, 2.25), (-62.75, 0.5))
            Line((-62.75, 0.5), (-87.75, 0.5))
            ThreePointArc((-87.75, 0.5), (-89.5, 2.25), (-87.75, 4))
        make_face()
    extrude(amount=-CUT_EXTRUDE9_DEPTH, mode=Mode.SUBTRACT)

    # Fillet2
    fillet2_edges = [part.edges().sort_by_distance(p)[0] for p in [
        (-59.642080737, -2.5, -11),
        (-53.868569278, 29.5, -11),
        (-93, -2.5, -11),
        (-93, 29.5, -11),
    ]]
    fillet(fillet2_edges, radius=FILLET2_R)

    # Sketch27 → Cut-Extrude10 (cut, through all)
    with BuildSketch(Plane(origin=(0, 22.5, 0), x_dir=(1, 0, 0), z_dir=(0, 1, 0))):
        with Locations((17.5, 16)):
            Rectangle(SKETCH27_W, SKETCH27_H)
    extrude(amount=-CUT_EXTRUDE10_DEPTH, mode=Mode.SUBTRACT)

    # Sketch28 → Boss-Extrude15 (add)
    with BuildSketch(Plane.XY.offset(-8.5)):
        with Locations((17.5, 0)):
            Circle(SKETCH28_R)
        with Locations((17.5, 15)):
            Circle(SKETCH28_R)
    extrude(amount=-BOSS_EXTRUDE15_DEPTH)

    # Sketch29 → Boss-Extrude16 (add)
    with BuildSketch(Plane(origin=(27.5, 0, 0), x_dir=(0, 0, -1), z_dir=(1, 0, 0))):
        with Locations((11, 7.5)):
            Rectangle(SKETCH29_W, SKETCH29_H)
    extrude(amount=BOSS_EXTRUDE16_DEPTH)

    # Sketch30 → Cut-Extrude12 (cut)
    with BuildSketch(Plane.XY.offset(-8.5)):
        with Locations((29.682858342, 15)):
            Circle(SKETCH30_R)
        with Locations((29.682858342, 0)):
            Circle(SKETCH30_R)
    extrude(amount=-CUT_EXTRUDE12_DEPTH, mode=Mode.SUBTRACT)

    # Fillet3
    fillet3_edges = [part.edges().sort_by_distance(p)[0] for p in [
        (42.5, 22.5, -11),
        (42.5, -7.5, -11),
        (10.869317712, 22.5, -11),
        (10.869317712, -7.5, -11),
    ]]
    fillet(fillet3_edges, radius=FILLET3_R)

    # Sketch33 → Boss-Extrude18 (add)
    with BuildSketch(Plane.ZY.offset(93)):
        with BuildLine():
            ThreePointArc((-13.5, 8.5), (-9.964466094, 9.964466094), (-8.5, 13.5))
            Line((-8.5, 13.5), (-13.5, 13.5))
            Line((-13.5, 13.5), (-13.5, 8.5))
        make_face()
        with BuildLine():
            Line((-13.5, 13.5), (-8.5, 13.5))
            ThreePointArc((-8.5, 13.5), (-9.964466094, 17.035533906), (-13.5, 18.5))
            Line((-13.5, 18.5), (-13.5, 13.5))
        make_face()
        with BuildLine():
            Line((-13.5, 8.5), (-13.5, 13.5))
            Line((-13.5, 13.5), (-18.5, 13.5))
            ThreePointArc((-18.5, 13.5), (-17.035533906, 9.964466094), (-13.5, 8.5))
        make_face()
        with BuildLine():
            Line((-18.5, 13.5), (-13.5, 13.5))
            Line((-13.5, 13.5), (-13.5, 18.5))
            ThreePointArc((-13.5, 18.5), (-17.035533906, 17.035533906), (-18.5, 13.5))
        make_face()
    extrude(amount=BOSS_EXTRUDE18_DEPTH)

    # Sketch34 → Cut-Extrude13 (cut, through all)
    with BuildSketch(Plane.XY.offset(-8.5)):
        with Locations((-60, 17.75)):
            Circle(SKETCH34_R)
    extrude(amount=-CUT_EXTRUDE13_DEPTH, mode=Mode.SUBTRACT)

    # Sketch35 → Cut-Extrude14 (cut)
    with BuildSketch(Plane.XY.offset(-8.5)):
        with Locations((-60, 17.75)):
            Circle(SKETCH35_R)
    extrude(amount=-CUT_EXTRUDE14_DEPTH, mode=Mode.SUBTRACT)


solid = part.part
